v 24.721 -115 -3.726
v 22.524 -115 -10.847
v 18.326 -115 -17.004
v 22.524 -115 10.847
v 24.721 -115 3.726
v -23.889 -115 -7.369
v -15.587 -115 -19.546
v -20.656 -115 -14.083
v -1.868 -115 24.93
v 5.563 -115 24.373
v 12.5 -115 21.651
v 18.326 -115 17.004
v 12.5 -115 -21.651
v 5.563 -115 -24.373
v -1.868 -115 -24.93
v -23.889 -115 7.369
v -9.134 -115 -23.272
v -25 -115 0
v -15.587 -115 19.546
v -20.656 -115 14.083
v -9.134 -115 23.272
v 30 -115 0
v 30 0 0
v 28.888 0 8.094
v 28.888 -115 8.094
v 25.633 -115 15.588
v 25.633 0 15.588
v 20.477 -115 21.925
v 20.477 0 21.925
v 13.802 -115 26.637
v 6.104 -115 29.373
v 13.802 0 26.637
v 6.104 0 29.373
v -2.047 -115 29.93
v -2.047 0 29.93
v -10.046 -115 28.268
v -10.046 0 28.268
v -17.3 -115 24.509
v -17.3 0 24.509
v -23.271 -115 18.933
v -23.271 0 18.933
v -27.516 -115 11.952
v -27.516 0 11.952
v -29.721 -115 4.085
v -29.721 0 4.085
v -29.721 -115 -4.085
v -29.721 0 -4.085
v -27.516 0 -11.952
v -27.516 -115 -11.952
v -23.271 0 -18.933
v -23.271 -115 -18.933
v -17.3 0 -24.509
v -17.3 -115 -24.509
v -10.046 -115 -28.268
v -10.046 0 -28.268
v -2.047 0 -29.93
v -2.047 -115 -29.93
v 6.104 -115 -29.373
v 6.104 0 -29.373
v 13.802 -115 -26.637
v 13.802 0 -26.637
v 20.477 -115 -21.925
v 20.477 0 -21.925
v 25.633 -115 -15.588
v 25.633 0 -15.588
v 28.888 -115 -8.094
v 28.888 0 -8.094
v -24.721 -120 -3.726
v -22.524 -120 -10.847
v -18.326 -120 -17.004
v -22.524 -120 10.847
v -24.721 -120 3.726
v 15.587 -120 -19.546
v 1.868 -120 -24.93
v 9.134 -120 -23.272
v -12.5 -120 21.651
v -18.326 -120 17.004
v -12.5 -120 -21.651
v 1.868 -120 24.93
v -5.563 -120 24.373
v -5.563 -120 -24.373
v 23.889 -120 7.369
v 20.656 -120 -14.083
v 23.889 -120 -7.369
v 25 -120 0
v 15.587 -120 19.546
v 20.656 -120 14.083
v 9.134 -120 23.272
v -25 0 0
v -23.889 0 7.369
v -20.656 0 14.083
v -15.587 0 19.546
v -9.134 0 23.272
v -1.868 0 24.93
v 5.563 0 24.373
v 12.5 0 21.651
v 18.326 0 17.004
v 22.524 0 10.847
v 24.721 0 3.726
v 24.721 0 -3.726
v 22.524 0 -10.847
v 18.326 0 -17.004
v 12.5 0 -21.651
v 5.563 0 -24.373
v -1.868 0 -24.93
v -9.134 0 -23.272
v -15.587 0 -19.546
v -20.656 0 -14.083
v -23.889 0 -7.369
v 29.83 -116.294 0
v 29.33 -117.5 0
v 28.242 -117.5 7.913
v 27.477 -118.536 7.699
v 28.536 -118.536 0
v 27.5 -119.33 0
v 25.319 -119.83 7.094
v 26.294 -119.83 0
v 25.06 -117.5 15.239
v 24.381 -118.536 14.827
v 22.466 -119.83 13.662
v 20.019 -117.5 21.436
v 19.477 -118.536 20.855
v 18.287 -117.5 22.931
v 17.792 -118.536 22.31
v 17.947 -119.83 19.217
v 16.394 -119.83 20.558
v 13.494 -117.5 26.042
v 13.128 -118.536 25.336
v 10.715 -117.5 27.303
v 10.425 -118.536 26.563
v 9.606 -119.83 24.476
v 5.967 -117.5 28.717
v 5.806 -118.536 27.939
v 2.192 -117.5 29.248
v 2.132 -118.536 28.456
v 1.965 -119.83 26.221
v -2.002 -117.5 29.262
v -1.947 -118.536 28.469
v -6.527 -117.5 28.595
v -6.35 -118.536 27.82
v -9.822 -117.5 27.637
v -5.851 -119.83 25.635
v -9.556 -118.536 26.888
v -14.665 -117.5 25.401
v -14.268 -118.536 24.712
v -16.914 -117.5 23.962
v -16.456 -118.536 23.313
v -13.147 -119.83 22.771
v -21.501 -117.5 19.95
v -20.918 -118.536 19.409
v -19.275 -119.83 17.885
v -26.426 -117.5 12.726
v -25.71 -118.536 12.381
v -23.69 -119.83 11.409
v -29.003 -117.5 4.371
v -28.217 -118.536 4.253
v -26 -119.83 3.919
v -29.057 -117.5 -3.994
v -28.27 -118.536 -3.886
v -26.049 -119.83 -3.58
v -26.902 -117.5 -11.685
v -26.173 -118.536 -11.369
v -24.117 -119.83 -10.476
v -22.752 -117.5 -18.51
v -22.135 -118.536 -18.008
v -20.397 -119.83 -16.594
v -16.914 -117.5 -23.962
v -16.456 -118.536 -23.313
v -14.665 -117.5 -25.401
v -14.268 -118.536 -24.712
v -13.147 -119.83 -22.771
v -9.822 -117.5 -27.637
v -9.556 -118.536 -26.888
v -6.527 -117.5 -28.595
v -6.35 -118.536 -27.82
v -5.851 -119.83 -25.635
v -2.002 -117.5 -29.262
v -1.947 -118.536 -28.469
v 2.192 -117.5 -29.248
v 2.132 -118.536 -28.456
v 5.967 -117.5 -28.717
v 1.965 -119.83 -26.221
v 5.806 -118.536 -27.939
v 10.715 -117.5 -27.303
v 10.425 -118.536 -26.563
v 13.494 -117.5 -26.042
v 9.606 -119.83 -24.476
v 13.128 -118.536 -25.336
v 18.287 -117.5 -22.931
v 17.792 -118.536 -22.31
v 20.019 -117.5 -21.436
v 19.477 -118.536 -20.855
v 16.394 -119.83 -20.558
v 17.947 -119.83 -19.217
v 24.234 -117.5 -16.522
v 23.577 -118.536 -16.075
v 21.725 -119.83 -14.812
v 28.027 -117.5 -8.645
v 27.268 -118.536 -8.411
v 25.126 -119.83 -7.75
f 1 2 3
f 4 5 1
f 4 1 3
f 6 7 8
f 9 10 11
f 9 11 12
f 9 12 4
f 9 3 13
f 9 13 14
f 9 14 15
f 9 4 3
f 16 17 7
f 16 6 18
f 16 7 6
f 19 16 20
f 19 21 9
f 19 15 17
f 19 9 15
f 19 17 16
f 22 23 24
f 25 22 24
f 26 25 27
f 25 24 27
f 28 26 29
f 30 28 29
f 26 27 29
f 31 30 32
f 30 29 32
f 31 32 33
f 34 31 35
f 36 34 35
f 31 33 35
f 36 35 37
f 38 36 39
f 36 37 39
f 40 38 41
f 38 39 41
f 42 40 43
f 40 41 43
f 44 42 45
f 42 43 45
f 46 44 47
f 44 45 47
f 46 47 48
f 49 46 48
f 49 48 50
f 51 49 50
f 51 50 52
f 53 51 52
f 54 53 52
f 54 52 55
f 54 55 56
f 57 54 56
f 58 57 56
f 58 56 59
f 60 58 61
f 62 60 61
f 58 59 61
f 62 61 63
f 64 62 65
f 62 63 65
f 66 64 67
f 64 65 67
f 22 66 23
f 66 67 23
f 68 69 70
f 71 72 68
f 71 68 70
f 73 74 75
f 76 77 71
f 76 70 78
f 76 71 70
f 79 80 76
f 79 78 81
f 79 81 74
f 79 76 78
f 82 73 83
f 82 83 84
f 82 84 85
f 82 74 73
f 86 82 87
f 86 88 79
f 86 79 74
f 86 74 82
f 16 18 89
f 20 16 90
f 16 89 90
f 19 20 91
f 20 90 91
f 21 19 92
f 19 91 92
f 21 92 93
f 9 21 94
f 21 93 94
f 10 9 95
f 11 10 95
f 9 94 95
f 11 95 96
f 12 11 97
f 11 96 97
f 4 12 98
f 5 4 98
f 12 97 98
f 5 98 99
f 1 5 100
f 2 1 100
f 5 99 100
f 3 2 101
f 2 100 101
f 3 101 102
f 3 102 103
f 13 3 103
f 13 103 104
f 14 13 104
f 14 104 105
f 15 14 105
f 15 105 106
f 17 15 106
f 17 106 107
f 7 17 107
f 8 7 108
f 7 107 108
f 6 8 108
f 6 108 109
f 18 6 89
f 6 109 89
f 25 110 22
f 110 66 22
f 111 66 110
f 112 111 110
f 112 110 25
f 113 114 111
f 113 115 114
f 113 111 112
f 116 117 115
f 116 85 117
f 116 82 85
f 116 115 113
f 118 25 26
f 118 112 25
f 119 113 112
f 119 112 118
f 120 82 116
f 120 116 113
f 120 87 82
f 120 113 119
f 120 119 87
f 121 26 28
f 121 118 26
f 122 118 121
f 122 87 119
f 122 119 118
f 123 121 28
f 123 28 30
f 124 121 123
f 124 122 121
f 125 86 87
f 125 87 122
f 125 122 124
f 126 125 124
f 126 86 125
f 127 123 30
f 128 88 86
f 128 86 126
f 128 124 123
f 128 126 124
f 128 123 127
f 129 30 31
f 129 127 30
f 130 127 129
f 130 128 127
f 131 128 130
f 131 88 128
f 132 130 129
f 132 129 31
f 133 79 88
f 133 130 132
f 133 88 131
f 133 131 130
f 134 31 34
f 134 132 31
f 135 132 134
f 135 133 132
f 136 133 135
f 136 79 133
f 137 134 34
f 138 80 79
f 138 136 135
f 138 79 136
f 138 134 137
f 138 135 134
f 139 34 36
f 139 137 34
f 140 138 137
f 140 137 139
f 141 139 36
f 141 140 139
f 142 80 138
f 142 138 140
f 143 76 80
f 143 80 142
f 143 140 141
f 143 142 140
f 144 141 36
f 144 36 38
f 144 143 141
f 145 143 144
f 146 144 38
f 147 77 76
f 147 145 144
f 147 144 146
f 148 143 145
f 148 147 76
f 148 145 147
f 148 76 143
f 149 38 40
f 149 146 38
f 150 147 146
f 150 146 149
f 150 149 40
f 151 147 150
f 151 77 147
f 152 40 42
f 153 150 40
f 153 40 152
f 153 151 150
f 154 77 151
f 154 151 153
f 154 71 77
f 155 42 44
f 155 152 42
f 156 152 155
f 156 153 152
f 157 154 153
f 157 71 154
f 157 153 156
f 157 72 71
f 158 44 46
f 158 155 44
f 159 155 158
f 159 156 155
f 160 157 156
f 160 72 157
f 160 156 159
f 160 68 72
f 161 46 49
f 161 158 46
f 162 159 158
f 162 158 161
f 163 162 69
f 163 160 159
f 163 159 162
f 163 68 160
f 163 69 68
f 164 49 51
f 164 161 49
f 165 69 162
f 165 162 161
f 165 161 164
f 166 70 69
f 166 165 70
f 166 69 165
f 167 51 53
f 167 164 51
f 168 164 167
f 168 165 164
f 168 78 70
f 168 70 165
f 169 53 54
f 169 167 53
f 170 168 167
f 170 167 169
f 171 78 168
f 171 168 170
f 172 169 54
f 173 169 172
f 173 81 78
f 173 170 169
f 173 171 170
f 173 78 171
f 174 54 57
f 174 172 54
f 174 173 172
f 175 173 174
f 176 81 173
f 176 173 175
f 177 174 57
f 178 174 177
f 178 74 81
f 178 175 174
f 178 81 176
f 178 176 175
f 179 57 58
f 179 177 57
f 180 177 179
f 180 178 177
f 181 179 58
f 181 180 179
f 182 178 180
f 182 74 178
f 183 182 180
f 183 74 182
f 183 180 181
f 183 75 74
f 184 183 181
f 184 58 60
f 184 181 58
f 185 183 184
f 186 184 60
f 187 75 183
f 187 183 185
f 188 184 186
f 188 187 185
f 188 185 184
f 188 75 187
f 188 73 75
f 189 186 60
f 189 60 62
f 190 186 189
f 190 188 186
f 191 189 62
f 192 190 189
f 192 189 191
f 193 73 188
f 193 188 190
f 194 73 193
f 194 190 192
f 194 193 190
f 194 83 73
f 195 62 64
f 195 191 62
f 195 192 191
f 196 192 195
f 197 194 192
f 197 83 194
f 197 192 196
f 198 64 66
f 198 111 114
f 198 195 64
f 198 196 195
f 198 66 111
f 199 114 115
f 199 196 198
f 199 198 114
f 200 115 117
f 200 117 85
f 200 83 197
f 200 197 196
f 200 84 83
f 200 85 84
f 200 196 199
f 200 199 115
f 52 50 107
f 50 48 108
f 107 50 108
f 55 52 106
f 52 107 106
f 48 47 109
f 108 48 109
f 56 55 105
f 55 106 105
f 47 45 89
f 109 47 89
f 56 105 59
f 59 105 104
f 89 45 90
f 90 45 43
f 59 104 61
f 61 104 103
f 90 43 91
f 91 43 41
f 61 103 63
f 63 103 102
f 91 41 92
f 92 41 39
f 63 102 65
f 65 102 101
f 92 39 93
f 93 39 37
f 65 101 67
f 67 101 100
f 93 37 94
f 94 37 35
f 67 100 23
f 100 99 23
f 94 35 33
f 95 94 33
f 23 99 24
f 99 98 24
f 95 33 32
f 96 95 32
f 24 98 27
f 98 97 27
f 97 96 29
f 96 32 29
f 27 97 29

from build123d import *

# Parameters (mm, degrees)
F0_R     = 30
F1_DEPTH = 120
F2_R     = 25
F3_DEPTH = 115
F4_R     = 5


with BuildPart() as f1:
    # F0 (on Front) → F1 (new body)
    with BuildSketch(Plane.XZ):
        Circle(F0_R)
    extrude(amount=F1_DEPTH)

    # F2 (on face) → F3 (cut)
    with BuildSketch(Plane(origin=(0, 0, 0), x_dir=(-1, 0, 0), z_dir=(0, 1, 0))):
        Circle(F2_R)
    extrude(amount=-F3_DEPTH, mode=Mode.SUBTRACT)

    # F4
    f4_edges = [f1.edges().sort_by_distance(p)[0] for p in [
        (-30, -120, 0),
    ]]
    fillet(f4_edges, radius=F4_R)


solid = f1.part
